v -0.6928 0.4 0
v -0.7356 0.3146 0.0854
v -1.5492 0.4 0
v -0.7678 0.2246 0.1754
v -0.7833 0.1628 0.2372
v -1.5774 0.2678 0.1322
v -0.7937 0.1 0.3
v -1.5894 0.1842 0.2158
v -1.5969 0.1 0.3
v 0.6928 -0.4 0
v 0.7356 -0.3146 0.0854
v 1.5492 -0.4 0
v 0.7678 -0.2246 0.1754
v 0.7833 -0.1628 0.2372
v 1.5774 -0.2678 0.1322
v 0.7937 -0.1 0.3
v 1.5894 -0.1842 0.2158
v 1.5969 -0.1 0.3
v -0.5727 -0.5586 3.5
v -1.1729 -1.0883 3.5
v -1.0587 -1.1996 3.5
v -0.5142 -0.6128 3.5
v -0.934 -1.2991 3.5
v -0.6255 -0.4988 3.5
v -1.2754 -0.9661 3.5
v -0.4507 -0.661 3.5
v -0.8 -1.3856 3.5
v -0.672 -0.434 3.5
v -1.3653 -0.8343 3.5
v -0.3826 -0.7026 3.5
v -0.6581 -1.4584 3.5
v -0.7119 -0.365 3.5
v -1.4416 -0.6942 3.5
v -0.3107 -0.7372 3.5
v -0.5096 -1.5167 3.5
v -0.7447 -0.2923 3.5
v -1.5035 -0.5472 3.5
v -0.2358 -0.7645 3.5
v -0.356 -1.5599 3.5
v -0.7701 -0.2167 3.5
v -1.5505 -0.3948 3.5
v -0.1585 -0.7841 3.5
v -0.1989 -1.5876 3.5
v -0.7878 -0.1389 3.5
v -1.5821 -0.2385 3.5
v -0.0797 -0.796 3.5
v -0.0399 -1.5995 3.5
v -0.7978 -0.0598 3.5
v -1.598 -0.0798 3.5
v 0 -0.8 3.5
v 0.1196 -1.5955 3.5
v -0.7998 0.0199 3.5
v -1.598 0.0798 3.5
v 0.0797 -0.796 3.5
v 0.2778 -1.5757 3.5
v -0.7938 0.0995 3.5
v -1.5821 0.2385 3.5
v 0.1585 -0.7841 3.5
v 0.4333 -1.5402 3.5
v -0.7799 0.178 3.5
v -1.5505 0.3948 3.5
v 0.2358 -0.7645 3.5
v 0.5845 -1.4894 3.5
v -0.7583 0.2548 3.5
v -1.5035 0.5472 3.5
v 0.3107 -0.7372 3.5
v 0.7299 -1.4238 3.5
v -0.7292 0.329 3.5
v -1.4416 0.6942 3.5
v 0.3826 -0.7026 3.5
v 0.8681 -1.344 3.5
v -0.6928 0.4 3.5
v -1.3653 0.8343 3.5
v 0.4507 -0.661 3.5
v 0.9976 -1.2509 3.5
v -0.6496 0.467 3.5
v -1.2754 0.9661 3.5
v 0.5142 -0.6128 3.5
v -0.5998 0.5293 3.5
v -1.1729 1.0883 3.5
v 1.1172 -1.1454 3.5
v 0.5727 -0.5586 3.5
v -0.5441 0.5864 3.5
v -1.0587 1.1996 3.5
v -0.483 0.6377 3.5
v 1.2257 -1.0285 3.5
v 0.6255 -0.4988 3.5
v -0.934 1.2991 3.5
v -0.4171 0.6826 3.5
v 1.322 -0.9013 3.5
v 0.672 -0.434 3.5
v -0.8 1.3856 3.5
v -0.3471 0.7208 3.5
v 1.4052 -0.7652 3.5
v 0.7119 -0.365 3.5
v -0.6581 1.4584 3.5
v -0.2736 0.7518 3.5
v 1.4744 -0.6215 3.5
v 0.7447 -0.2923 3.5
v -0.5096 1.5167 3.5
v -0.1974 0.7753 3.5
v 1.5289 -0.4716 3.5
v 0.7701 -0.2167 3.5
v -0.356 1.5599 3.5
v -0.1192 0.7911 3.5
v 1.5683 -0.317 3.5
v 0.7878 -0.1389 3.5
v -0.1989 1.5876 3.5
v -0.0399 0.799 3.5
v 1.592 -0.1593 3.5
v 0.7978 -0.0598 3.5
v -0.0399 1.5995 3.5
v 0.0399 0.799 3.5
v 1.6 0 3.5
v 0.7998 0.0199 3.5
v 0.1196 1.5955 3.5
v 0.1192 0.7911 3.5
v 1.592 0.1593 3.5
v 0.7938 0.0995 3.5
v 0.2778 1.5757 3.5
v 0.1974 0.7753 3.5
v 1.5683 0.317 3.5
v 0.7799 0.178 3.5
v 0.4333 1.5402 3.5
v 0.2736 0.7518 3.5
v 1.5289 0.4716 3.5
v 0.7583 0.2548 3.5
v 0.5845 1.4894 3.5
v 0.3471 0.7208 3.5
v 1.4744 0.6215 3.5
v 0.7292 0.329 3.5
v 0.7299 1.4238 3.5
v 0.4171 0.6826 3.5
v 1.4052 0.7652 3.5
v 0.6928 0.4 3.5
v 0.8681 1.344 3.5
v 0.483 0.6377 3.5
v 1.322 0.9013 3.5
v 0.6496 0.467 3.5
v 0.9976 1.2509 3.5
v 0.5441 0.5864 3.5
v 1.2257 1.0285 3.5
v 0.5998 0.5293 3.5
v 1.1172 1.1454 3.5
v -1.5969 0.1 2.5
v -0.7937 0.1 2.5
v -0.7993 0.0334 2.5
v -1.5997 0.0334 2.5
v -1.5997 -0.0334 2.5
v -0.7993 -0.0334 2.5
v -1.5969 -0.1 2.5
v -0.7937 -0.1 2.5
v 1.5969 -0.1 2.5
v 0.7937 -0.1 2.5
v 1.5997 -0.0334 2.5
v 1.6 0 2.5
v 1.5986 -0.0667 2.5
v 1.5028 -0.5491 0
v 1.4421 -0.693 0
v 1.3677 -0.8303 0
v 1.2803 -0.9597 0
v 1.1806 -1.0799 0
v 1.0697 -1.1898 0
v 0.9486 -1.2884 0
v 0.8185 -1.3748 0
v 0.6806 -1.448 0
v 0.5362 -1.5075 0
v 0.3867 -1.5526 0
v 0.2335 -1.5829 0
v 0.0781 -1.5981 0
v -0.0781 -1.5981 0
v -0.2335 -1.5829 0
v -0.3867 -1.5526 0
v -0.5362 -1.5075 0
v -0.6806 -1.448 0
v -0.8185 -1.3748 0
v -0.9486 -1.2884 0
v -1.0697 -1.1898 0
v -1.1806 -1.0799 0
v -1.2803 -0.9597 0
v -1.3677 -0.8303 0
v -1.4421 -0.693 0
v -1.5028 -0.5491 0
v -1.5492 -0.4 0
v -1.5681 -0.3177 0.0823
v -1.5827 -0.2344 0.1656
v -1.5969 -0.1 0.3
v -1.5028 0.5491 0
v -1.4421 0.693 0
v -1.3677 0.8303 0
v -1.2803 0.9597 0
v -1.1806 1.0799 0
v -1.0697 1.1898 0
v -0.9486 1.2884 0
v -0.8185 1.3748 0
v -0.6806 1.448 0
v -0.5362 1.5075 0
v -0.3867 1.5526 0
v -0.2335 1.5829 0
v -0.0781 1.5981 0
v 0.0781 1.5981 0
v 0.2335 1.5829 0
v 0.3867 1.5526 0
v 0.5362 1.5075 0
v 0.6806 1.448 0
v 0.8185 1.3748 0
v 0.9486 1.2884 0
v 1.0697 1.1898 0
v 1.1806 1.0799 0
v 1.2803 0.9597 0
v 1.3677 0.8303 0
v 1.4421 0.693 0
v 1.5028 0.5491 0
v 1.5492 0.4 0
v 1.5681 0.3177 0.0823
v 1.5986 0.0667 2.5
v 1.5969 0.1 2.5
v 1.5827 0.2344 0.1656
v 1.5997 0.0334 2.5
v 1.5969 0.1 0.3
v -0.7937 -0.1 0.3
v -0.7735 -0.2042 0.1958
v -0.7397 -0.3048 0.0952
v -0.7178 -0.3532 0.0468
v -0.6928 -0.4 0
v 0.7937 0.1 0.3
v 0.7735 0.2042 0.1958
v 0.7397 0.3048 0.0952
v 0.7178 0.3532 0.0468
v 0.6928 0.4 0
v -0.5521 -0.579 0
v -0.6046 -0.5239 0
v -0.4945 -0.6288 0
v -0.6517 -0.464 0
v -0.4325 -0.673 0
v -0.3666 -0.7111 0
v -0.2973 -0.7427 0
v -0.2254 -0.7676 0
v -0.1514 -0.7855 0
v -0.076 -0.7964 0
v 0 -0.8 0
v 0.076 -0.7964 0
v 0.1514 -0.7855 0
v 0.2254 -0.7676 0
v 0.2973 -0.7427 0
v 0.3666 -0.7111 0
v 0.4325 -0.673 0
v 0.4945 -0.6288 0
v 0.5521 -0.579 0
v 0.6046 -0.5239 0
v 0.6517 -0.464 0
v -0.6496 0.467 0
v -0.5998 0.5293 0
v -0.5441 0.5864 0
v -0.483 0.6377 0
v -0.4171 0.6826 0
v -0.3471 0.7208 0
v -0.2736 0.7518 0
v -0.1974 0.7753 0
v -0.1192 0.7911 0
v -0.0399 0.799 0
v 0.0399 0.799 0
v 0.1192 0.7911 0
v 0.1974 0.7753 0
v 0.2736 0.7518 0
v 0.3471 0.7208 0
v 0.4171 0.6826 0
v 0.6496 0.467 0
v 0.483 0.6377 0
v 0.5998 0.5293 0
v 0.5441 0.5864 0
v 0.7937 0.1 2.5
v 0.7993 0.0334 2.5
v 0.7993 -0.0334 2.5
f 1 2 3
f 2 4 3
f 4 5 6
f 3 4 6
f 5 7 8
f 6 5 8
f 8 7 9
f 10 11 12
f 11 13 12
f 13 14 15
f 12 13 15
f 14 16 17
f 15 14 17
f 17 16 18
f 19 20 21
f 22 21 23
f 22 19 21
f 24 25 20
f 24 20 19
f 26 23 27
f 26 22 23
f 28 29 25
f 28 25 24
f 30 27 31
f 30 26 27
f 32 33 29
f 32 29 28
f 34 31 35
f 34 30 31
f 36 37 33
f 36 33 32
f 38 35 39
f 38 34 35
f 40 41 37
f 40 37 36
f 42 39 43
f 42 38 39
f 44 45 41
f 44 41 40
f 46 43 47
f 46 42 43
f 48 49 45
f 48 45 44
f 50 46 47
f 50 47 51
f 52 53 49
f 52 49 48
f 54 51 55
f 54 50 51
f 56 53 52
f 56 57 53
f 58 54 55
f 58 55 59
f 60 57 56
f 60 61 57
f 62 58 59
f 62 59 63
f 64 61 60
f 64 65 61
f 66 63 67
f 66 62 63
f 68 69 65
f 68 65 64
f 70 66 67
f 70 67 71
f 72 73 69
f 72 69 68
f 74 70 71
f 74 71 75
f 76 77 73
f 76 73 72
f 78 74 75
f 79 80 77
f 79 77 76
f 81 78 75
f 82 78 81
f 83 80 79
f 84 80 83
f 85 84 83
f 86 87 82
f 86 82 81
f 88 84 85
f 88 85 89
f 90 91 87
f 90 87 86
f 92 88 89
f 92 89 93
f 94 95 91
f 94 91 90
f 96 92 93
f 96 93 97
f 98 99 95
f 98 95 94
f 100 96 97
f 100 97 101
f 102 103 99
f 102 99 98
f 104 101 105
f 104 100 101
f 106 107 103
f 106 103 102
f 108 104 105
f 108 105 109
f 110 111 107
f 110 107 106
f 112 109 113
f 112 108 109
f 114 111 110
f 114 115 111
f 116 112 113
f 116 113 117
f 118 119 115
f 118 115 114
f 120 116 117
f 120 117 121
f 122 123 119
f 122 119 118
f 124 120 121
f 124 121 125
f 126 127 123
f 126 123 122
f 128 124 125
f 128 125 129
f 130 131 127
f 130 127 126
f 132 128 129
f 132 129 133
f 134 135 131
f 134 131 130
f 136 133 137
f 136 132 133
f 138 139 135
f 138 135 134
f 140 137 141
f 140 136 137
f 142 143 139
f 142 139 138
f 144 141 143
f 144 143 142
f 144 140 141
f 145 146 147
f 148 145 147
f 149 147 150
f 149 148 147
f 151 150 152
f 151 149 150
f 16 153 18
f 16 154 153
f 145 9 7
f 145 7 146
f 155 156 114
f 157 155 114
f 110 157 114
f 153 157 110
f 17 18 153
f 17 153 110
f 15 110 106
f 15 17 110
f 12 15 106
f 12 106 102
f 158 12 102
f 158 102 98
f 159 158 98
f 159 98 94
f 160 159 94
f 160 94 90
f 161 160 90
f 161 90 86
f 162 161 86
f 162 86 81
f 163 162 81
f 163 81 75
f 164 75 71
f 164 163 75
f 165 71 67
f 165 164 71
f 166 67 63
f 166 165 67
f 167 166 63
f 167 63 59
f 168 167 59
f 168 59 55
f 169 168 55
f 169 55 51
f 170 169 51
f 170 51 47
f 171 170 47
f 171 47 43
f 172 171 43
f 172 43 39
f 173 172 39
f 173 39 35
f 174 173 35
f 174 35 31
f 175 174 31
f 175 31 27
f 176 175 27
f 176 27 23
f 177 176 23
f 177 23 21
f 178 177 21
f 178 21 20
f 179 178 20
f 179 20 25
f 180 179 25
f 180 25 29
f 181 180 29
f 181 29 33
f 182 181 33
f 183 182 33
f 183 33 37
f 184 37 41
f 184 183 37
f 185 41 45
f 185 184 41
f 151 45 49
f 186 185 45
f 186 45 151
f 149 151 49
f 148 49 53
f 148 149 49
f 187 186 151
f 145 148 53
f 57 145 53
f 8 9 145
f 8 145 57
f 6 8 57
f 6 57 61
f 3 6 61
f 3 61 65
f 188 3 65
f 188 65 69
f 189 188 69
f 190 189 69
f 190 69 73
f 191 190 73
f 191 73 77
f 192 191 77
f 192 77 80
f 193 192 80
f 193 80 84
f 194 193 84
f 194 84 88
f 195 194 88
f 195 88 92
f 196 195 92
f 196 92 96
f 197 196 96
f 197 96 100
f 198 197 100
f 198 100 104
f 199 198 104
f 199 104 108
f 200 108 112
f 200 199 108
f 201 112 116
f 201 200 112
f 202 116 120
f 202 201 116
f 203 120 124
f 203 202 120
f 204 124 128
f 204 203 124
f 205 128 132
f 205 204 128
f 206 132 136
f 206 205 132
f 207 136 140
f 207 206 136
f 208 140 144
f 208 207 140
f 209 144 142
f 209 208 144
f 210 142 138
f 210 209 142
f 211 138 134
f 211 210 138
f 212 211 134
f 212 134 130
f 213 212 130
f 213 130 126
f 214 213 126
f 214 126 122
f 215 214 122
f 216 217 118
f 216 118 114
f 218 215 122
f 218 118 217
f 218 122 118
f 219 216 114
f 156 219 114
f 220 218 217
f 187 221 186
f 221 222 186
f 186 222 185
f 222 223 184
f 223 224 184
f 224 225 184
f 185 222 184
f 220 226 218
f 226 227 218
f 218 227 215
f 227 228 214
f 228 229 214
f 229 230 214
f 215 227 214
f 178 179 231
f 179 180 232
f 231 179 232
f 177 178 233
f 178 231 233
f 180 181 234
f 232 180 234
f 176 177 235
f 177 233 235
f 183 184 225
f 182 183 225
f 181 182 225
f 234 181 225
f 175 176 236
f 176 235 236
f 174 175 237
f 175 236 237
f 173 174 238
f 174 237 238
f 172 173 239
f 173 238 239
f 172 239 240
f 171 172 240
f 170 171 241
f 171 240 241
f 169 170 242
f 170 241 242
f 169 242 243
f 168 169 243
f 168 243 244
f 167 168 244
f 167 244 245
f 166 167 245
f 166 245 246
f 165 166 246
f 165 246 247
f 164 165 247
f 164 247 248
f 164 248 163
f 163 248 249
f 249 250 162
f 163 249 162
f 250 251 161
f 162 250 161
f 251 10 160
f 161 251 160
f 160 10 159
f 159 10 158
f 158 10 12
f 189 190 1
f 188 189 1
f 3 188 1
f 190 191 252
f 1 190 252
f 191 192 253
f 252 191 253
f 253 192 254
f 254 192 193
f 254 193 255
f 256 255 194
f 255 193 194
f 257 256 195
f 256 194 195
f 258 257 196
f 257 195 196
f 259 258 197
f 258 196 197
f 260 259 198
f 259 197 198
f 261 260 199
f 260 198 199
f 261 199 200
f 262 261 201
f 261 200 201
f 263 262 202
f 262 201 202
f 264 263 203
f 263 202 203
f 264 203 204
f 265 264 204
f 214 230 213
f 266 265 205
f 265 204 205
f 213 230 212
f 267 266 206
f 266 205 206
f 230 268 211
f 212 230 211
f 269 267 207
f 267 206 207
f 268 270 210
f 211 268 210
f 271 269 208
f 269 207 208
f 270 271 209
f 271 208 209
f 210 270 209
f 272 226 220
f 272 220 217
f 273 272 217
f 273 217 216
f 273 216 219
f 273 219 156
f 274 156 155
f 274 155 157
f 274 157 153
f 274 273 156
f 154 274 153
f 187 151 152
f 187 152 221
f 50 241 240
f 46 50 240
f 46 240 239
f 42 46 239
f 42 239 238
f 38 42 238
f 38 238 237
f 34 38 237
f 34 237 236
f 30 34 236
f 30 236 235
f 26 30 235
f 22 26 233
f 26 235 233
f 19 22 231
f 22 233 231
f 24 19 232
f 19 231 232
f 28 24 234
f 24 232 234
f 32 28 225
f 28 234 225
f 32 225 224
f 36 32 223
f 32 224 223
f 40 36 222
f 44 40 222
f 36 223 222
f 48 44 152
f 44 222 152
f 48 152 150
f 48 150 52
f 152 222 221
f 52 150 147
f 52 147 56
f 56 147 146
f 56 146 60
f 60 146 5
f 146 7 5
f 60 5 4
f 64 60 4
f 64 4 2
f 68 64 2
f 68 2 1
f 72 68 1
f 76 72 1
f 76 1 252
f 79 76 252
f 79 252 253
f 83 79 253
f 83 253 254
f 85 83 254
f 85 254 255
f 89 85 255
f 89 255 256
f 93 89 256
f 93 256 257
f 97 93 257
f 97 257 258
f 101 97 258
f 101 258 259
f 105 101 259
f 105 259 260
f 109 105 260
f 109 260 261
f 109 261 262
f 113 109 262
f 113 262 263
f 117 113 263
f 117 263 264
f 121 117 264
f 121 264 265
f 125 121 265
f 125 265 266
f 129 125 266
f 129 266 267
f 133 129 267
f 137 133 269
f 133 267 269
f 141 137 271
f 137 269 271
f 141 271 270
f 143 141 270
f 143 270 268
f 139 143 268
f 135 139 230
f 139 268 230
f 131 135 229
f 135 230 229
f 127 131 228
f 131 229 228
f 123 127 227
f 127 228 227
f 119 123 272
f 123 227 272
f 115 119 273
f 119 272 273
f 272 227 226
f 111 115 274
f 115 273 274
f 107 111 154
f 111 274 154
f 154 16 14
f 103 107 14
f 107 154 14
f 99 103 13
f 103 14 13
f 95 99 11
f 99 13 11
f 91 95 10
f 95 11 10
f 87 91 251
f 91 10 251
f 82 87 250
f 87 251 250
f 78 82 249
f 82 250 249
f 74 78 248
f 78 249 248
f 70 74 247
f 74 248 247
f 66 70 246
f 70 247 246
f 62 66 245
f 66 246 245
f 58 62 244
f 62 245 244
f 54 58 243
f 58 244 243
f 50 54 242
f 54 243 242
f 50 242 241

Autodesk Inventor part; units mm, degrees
ref_plane "YZ Plane" through (0, 0, 0) normal (1, 0, 0) x (0, 1, 0)
ref_plane "XZ Plane" through (0, 0, 0) normal (0, 1, 0) x (-1, 0, 0)
ref_plane "XY Plane" through (0, 0, 0) normal (0, 0, 1) x (1, 0, 0)
sketch "Sketch1" plane through (0, 0, 0) normal (0, 0, 1) x (1, 0, 0)
  circle A0 centre (0, 0) radius 1.6
  dimension "d0" = 3.2
extrude "Extrusion1" add sketch "Sketch1" along normal blind 3.5
hole "Hole1" at (0, 0, 3.5) direction (0, 0, -1) diameter 1.3 end through all counterbore diameter 1.6 counterbore depth 4
sketch "Sketch2" plane through (0, 0, 0) normal (1, 0, 0) x (0, 1, 0)
  line L0 (-0.1, 0) -> (0.1, 0)
  line L1 (0.1, 0) -> (0.1, 2.5)
  line L2 (0.1, 2.5) -> (-0.1, 2.5)
  line L3 (-0.1, 2.5) -> (-0.1, 0)
  point P0 (0, 0)
  point P1 (0, 0)
  dimension "d14" = 0.2
  dimension "d15" = 2.5
extrude "Extrusion2" cut sketch "Sketch2" along normal through all both and the other way through all
chamfer "Chamfer1" distance 0.3 angle 45 4 edges at (1.1953, 0.1, 0) (-1.1953, 0.1, 0) (-1.1953, -0.1, 0) (1.1953, -0.1, 0)
properties part number "402-02" material "PVC-U"
